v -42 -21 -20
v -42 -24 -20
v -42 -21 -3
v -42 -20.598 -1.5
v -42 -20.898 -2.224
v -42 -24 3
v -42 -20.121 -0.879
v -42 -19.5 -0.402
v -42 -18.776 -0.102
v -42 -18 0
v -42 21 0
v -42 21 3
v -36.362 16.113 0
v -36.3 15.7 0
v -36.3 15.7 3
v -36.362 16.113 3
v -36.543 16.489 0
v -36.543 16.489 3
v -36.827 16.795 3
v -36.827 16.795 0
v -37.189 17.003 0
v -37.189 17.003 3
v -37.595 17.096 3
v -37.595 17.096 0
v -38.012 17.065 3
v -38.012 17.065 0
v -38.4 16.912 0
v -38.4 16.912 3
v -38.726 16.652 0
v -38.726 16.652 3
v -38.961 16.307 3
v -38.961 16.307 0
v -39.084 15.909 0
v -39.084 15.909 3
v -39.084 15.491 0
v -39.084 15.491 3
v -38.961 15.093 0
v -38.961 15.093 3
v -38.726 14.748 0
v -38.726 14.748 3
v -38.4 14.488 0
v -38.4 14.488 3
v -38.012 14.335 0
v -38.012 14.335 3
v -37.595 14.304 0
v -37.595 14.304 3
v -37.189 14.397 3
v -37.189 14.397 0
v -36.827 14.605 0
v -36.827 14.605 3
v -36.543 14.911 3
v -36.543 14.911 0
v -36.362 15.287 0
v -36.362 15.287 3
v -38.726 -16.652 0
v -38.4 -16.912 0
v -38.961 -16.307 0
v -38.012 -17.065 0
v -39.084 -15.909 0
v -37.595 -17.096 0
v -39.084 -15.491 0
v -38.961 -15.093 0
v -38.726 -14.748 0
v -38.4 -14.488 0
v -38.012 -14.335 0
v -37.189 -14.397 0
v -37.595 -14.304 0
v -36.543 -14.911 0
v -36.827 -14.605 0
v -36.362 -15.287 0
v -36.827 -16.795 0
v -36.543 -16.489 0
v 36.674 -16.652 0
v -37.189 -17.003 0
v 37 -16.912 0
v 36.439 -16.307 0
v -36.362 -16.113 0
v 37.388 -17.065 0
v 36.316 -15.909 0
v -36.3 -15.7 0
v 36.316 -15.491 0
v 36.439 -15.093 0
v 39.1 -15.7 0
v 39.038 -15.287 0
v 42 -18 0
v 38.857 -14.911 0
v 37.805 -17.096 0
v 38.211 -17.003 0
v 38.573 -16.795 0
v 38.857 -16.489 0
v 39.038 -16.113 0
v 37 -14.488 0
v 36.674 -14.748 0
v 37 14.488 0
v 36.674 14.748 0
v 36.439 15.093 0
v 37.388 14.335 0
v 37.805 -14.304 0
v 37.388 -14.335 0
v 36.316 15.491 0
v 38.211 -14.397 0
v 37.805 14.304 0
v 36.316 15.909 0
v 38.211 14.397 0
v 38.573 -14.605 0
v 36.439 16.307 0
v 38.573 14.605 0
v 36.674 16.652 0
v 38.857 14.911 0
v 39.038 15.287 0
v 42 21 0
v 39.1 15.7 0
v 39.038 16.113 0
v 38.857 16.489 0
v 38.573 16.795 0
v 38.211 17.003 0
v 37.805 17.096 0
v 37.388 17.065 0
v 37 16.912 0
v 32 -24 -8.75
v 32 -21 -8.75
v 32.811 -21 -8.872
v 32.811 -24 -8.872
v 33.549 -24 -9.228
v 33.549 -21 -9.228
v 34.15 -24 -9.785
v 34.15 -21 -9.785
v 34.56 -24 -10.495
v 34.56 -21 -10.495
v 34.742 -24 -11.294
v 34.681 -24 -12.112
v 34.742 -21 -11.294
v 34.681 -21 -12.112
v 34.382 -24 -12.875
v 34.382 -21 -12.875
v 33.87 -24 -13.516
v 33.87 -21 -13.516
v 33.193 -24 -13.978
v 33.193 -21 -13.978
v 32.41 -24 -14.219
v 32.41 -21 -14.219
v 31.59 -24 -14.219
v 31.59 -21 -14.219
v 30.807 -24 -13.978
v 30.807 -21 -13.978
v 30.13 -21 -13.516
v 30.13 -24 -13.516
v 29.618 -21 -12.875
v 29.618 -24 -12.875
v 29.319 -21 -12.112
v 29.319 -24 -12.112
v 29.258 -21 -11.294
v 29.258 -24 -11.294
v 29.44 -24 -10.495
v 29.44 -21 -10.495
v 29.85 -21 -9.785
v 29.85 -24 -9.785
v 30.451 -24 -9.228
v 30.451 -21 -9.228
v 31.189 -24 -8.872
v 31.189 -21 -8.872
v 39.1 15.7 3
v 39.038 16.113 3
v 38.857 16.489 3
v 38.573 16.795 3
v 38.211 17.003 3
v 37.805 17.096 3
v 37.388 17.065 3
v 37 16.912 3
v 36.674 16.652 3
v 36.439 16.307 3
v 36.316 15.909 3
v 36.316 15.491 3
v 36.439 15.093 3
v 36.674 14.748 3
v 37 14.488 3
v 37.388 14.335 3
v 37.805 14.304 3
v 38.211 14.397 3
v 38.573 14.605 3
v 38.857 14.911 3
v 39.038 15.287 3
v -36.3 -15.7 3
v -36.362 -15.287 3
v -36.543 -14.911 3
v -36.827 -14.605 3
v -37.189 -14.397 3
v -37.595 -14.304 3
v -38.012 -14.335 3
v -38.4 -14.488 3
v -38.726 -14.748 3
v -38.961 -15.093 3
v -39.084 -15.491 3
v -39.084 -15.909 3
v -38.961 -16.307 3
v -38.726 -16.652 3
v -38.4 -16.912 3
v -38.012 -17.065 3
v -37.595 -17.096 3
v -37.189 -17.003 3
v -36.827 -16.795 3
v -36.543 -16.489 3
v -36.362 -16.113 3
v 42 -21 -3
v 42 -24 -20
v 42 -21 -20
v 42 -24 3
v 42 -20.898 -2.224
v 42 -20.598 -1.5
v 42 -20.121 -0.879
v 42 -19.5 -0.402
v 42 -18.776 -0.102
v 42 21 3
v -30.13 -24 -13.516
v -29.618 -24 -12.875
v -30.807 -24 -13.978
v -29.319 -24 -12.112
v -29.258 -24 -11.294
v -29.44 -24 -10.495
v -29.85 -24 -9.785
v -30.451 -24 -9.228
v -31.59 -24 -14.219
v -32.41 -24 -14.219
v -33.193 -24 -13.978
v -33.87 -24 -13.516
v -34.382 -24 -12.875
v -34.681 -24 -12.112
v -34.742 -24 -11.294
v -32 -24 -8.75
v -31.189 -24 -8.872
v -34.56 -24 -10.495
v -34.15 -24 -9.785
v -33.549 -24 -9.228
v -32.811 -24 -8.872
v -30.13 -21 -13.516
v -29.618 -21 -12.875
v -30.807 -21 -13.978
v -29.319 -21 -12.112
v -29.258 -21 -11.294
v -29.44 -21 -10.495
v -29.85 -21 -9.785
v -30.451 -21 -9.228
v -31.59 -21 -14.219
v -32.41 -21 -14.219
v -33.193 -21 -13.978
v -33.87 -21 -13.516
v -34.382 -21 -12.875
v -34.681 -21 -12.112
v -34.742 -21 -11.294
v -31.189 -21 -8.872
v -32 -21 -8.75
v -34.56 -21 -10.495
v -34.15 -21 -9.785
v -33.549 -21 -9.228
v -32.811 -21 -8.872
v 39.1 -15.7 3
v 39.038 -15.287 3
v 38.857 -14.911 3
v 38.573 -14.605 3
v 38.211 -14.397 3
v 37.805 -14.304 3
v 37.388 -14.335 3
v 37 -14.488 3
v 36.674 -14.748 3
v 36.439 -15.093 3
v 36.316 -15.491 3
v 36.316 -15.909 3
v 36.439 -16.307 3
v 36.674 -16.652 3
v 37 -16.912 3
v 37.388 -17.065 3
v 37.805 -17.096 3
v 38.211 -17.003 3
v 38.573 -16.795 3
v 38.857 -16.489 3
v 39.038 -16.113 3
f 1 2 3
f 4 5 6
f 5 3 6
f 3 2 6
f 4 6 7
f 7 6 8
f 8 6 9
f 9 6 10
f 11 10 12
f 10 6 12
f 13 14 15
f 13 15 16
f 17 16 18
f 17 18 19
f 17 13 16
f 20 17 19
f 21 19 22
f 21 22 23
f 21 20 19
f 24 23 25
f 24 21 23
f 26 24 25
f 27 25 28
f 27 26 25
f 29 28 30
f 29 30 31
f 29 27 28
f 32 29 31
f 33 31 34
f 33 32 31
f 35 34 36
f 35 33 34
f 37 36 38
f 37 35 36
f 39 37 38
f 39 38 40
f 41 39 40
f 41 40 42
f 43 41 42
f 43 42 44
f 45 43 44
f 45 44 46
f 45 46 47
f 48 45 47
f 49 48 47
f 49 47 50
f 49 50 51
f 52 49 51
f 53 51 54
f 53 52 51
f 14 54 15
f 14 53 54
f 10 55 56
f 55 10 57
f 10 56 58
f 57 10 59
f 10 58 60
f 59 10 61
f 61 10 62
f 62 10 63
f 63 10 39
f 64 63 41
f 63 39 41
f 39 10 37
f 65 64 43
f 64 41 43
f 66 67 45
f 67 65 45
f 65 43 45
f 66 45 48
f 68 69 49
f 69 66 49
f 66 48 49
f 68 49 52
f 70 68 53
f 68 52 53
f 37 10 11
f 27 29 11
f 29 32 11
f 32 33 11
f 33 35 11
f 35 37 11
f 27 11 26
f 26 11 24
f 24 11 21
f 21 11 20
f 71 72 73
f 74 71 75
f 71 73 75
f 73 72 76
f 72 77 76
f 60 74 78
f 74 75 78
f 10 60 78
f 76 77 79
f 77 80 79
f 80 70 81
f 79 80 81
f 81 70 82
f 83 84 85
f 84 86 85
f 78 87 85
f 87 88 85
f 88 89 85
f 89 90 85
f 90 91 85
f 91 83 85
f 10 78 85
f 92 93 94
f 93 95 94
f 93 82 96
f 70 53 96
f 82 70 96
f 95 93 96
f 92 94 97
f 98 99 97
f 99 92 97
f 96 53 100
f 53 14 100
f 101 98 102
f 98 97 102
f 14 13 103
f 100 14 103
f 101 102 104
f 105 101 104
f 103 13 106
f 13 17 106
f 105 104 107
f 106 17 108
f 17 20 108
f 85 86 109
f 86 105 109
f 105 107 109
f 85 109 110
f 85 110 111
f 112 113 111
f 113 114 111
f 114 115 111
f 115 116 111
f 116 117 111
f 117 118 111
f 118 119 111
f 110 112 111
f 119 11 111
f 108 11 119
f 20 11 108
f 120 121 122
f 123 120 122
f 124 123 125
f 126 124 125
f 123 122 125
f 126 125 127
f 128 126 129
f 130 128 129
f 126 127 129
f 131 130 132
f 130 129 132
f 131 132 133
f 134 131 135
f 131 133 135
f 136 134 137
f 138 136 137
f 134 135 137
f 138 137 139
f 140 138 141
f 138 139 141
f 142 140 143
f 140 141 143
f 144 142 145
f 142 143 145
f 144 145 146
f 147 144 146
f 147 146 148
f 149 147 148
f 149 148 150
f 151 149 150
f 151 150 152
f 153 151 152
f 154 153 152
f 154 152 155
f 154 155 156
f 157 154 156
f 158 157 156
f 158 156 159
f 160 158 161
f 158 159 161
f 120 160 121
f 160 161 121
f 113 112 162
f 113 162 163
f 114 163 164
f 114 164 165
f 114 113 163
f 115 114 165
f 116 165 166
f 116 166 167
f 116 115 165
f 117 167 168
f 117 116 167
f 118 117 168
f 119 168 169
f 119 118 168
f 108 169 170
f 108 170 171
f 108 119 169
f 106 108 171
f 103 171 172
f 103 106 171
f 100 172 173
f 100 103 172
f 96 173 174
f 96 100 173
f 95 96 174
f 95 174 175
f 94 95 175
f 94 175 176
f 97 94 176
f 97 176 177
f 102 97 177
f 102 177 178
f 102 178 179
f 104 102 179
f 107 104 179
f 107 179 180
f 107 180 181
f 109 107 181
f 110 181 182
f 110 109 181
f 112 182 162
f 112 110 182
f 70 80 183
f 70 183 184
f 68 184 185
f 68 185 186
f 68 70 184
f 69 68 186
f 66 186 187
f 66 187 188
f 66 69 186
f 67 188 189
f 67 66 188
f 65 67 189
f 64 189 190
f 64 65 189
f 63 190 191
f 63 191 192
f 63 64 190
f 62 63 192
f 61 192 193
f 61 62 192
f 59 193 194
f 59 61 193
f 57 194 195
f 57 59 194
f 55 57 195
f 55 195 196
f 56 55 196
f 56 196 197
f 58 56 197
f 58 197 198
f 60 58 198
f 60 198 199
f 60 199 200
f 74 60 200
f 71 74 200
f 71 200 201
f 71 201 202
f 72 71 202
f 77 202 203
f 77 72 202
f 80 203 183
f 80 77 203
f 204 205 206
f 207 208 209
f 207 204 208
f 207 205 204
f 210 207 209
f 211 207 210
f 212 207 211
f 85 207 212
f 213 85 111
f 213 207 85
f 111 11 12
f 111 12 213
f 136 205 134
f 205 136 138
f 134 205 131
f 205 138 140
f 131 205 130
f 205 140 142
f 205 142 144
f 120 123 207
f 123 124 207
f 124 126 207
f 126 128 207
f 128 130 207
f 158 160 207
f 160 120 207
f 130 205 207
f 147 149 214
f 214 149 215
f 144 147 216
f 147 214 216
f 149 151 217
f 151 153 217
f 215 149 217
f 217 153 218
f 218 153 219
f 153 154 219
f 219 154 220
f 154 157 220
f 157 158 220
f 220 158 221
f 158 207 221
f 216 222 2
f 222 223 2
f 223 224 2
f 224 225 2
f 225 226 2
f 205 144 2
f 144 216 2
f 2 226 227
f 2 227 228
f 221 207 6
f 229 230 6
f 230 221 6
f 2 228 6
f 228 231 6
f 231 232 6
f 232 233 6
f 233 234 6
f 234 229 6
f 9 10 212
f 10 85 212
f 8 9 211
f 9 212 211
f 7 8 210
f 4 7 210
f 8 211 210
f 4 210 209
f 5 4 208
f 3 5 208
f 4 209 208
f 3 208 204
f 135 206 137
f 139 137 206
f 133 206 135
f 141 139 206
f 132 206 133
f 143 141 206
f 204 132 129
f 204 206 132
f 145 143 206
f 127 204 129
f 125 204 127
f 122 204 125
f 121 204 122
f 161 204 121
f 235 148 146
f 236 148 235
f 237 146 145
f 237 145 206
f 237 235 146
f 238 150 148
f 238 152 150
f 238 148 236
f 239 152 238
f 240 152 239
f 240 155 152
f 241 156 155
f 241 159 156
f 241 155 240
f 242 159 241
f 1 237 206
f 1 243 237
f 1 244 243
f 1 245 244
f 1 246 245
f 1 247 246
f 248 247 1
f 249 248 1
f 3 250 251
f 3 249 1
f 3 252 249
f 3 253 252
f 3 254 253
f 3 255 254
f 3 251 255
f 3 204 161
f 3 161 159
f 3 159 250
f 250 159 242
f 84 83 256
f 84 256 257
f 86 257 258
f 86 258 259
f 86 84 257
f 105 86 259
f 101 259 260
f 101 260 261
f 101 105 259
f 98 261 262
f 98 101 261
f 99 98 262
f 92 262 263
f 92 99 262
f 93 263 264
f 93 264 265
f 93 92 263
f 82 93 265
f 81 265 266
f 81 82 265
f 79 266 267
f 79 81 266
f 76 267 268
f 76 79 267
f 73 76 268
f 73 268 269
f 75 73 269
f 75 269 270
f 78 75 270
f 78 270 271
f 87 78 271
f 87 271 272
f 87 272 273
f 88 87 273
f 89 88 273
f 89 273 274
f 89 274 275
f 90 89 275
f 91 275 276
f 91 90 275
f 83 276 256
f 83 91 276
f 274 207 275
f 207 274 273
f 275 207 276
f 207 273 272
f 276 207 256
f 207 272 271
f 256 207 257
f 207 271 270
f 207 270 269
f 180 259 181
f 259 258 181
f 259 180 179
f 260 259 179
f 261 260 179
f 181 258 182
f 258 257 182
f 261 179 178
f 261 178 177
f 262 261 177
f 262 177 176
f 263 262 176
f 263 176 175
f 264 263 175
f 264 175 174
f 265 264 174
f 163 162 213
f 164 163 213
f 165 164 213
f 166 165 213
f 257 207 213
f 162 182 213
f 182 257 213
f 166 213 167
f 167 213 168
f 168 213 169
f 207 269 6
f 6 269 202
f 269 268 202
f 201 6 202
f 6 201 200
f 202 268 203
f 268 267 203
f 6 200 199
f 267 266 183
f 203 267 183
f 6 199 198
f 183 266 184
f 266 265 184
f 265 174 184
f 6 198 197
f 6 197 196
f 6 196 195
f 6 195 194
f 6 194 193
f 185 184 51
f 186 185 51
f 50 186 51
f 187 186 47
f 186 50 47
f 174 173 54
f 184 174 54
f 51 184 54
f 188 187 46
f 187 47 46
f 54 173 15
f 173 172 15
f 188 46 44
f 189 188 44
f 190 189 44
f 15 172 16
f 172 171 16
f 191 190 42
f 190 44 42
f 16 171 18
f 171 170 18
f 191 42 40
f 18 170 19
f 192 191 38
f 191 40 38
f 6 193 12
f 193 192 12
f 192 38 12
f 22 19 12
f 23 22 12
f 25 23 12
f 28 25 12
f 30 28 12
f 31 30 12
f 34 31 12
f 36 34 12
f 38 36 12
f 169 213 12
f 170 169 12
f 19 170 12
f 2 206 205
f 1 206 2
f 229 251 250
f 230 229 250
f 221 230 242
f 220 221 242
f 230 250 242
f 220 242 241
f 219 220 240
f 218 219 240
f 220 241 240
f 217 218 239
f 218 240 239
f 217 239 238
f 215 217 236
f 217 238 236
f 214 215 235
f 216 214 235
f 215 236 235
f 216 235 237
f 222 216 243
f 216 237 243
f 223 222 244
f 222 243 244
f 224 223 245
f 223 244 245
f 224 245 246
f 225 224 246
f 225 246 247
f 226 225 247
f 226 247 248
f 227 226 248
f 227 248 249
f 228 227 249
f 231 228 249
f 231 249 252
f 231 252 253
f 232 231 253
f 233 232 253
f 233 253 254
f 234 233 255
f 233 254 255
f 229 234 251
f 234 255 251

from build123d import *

# Parameters (mm, degrees)
SKETCH1_W                = 84
SKETCH1_H                = 42
SKETCH1_R                = 1.4
BOSS_EXTRUDE1_DEPTH      = 3
BOSS_EXTRUDE2_DEPTH      = 20
BOSS_EXTRUDE2_DEPTH_BACK = 3
SKETCH2_W                = 84
SKETCH2_H                = 3
FILLET1_R                = 3
SKETCH5_R                = 2.75
CUT_EXTRUDE1_DEPTH       = 3


with BuildPart() as part:
    # Sketch1 → Boss-Extrude1 (new body)
    with BuildSketch(Plane.XY):
        Rectangle(SKETCH1_W, SKETCH1_H)
        with Locations((-37.7, 15.7)):
            Circle(SKETCH1_R, mode=Mode.SUBTRACT)
        with Locations((37.7, 15.7)):
            Circle(SKETCH1_R, mode=Mode.SUBTRACT)
        with Locations((37.7, -15.7)):
            Circle(SKETCH1_R, mode=Mode.SUBTRACT)
        with Locations((-37.7, -15.7)):
            Circle(SKETCH1_R, mode=Mode.SUBTRACT)
    extrude(amount=BOSS_EXTRUDE1_DEPTH)

    # Sketch2 → Boss-Extrude2 (add, two sides: drawn at the far end of the back side and taken through both)
    with BuildSketch(Plane(origin=(0, 0, 0), x_dir=(-1, 0, 0), z_dir=(0, 0, -1)).offset(-BOSS_EXTRUDE2_DEPTH_BACK)):
        with Locations((0, -22.5)):
            Rectangle(SKETCH2_W, SKETCH2_H)
    extrude(amount=BOSS_EXTRUDE2_DEPTH + BOSS_EXTRUDE2_DEPTH_BACK)

    # Fillet1
    fillet1_edges = [part.edges().sort_by_distance(p)[0] for p in [
        (0, -21, 0),
    ]]
    fillet(fillet1_edges, radius=FILLET1_R)

    # Sketch5 → Cut-Extrude1 (cut)
    with BuildSketch(Plane(origin=(0, -21, 0), x_dir=(1, 0, 0), z_dir=(0, 1, 0))):
        with Locations(Location((-32, 11.5, 0), (0, 0, 270))):
            Circle(SKETCH5_R)
        with Locations(Location((32, 11.5, 0), (0, 0, 270))):
            Circle(SKETCH5_R)
    extrude(amount=-CUT_EXTRUDE1_DEPTH, mode=Mode.SUBTRACT)


solid = part.part
